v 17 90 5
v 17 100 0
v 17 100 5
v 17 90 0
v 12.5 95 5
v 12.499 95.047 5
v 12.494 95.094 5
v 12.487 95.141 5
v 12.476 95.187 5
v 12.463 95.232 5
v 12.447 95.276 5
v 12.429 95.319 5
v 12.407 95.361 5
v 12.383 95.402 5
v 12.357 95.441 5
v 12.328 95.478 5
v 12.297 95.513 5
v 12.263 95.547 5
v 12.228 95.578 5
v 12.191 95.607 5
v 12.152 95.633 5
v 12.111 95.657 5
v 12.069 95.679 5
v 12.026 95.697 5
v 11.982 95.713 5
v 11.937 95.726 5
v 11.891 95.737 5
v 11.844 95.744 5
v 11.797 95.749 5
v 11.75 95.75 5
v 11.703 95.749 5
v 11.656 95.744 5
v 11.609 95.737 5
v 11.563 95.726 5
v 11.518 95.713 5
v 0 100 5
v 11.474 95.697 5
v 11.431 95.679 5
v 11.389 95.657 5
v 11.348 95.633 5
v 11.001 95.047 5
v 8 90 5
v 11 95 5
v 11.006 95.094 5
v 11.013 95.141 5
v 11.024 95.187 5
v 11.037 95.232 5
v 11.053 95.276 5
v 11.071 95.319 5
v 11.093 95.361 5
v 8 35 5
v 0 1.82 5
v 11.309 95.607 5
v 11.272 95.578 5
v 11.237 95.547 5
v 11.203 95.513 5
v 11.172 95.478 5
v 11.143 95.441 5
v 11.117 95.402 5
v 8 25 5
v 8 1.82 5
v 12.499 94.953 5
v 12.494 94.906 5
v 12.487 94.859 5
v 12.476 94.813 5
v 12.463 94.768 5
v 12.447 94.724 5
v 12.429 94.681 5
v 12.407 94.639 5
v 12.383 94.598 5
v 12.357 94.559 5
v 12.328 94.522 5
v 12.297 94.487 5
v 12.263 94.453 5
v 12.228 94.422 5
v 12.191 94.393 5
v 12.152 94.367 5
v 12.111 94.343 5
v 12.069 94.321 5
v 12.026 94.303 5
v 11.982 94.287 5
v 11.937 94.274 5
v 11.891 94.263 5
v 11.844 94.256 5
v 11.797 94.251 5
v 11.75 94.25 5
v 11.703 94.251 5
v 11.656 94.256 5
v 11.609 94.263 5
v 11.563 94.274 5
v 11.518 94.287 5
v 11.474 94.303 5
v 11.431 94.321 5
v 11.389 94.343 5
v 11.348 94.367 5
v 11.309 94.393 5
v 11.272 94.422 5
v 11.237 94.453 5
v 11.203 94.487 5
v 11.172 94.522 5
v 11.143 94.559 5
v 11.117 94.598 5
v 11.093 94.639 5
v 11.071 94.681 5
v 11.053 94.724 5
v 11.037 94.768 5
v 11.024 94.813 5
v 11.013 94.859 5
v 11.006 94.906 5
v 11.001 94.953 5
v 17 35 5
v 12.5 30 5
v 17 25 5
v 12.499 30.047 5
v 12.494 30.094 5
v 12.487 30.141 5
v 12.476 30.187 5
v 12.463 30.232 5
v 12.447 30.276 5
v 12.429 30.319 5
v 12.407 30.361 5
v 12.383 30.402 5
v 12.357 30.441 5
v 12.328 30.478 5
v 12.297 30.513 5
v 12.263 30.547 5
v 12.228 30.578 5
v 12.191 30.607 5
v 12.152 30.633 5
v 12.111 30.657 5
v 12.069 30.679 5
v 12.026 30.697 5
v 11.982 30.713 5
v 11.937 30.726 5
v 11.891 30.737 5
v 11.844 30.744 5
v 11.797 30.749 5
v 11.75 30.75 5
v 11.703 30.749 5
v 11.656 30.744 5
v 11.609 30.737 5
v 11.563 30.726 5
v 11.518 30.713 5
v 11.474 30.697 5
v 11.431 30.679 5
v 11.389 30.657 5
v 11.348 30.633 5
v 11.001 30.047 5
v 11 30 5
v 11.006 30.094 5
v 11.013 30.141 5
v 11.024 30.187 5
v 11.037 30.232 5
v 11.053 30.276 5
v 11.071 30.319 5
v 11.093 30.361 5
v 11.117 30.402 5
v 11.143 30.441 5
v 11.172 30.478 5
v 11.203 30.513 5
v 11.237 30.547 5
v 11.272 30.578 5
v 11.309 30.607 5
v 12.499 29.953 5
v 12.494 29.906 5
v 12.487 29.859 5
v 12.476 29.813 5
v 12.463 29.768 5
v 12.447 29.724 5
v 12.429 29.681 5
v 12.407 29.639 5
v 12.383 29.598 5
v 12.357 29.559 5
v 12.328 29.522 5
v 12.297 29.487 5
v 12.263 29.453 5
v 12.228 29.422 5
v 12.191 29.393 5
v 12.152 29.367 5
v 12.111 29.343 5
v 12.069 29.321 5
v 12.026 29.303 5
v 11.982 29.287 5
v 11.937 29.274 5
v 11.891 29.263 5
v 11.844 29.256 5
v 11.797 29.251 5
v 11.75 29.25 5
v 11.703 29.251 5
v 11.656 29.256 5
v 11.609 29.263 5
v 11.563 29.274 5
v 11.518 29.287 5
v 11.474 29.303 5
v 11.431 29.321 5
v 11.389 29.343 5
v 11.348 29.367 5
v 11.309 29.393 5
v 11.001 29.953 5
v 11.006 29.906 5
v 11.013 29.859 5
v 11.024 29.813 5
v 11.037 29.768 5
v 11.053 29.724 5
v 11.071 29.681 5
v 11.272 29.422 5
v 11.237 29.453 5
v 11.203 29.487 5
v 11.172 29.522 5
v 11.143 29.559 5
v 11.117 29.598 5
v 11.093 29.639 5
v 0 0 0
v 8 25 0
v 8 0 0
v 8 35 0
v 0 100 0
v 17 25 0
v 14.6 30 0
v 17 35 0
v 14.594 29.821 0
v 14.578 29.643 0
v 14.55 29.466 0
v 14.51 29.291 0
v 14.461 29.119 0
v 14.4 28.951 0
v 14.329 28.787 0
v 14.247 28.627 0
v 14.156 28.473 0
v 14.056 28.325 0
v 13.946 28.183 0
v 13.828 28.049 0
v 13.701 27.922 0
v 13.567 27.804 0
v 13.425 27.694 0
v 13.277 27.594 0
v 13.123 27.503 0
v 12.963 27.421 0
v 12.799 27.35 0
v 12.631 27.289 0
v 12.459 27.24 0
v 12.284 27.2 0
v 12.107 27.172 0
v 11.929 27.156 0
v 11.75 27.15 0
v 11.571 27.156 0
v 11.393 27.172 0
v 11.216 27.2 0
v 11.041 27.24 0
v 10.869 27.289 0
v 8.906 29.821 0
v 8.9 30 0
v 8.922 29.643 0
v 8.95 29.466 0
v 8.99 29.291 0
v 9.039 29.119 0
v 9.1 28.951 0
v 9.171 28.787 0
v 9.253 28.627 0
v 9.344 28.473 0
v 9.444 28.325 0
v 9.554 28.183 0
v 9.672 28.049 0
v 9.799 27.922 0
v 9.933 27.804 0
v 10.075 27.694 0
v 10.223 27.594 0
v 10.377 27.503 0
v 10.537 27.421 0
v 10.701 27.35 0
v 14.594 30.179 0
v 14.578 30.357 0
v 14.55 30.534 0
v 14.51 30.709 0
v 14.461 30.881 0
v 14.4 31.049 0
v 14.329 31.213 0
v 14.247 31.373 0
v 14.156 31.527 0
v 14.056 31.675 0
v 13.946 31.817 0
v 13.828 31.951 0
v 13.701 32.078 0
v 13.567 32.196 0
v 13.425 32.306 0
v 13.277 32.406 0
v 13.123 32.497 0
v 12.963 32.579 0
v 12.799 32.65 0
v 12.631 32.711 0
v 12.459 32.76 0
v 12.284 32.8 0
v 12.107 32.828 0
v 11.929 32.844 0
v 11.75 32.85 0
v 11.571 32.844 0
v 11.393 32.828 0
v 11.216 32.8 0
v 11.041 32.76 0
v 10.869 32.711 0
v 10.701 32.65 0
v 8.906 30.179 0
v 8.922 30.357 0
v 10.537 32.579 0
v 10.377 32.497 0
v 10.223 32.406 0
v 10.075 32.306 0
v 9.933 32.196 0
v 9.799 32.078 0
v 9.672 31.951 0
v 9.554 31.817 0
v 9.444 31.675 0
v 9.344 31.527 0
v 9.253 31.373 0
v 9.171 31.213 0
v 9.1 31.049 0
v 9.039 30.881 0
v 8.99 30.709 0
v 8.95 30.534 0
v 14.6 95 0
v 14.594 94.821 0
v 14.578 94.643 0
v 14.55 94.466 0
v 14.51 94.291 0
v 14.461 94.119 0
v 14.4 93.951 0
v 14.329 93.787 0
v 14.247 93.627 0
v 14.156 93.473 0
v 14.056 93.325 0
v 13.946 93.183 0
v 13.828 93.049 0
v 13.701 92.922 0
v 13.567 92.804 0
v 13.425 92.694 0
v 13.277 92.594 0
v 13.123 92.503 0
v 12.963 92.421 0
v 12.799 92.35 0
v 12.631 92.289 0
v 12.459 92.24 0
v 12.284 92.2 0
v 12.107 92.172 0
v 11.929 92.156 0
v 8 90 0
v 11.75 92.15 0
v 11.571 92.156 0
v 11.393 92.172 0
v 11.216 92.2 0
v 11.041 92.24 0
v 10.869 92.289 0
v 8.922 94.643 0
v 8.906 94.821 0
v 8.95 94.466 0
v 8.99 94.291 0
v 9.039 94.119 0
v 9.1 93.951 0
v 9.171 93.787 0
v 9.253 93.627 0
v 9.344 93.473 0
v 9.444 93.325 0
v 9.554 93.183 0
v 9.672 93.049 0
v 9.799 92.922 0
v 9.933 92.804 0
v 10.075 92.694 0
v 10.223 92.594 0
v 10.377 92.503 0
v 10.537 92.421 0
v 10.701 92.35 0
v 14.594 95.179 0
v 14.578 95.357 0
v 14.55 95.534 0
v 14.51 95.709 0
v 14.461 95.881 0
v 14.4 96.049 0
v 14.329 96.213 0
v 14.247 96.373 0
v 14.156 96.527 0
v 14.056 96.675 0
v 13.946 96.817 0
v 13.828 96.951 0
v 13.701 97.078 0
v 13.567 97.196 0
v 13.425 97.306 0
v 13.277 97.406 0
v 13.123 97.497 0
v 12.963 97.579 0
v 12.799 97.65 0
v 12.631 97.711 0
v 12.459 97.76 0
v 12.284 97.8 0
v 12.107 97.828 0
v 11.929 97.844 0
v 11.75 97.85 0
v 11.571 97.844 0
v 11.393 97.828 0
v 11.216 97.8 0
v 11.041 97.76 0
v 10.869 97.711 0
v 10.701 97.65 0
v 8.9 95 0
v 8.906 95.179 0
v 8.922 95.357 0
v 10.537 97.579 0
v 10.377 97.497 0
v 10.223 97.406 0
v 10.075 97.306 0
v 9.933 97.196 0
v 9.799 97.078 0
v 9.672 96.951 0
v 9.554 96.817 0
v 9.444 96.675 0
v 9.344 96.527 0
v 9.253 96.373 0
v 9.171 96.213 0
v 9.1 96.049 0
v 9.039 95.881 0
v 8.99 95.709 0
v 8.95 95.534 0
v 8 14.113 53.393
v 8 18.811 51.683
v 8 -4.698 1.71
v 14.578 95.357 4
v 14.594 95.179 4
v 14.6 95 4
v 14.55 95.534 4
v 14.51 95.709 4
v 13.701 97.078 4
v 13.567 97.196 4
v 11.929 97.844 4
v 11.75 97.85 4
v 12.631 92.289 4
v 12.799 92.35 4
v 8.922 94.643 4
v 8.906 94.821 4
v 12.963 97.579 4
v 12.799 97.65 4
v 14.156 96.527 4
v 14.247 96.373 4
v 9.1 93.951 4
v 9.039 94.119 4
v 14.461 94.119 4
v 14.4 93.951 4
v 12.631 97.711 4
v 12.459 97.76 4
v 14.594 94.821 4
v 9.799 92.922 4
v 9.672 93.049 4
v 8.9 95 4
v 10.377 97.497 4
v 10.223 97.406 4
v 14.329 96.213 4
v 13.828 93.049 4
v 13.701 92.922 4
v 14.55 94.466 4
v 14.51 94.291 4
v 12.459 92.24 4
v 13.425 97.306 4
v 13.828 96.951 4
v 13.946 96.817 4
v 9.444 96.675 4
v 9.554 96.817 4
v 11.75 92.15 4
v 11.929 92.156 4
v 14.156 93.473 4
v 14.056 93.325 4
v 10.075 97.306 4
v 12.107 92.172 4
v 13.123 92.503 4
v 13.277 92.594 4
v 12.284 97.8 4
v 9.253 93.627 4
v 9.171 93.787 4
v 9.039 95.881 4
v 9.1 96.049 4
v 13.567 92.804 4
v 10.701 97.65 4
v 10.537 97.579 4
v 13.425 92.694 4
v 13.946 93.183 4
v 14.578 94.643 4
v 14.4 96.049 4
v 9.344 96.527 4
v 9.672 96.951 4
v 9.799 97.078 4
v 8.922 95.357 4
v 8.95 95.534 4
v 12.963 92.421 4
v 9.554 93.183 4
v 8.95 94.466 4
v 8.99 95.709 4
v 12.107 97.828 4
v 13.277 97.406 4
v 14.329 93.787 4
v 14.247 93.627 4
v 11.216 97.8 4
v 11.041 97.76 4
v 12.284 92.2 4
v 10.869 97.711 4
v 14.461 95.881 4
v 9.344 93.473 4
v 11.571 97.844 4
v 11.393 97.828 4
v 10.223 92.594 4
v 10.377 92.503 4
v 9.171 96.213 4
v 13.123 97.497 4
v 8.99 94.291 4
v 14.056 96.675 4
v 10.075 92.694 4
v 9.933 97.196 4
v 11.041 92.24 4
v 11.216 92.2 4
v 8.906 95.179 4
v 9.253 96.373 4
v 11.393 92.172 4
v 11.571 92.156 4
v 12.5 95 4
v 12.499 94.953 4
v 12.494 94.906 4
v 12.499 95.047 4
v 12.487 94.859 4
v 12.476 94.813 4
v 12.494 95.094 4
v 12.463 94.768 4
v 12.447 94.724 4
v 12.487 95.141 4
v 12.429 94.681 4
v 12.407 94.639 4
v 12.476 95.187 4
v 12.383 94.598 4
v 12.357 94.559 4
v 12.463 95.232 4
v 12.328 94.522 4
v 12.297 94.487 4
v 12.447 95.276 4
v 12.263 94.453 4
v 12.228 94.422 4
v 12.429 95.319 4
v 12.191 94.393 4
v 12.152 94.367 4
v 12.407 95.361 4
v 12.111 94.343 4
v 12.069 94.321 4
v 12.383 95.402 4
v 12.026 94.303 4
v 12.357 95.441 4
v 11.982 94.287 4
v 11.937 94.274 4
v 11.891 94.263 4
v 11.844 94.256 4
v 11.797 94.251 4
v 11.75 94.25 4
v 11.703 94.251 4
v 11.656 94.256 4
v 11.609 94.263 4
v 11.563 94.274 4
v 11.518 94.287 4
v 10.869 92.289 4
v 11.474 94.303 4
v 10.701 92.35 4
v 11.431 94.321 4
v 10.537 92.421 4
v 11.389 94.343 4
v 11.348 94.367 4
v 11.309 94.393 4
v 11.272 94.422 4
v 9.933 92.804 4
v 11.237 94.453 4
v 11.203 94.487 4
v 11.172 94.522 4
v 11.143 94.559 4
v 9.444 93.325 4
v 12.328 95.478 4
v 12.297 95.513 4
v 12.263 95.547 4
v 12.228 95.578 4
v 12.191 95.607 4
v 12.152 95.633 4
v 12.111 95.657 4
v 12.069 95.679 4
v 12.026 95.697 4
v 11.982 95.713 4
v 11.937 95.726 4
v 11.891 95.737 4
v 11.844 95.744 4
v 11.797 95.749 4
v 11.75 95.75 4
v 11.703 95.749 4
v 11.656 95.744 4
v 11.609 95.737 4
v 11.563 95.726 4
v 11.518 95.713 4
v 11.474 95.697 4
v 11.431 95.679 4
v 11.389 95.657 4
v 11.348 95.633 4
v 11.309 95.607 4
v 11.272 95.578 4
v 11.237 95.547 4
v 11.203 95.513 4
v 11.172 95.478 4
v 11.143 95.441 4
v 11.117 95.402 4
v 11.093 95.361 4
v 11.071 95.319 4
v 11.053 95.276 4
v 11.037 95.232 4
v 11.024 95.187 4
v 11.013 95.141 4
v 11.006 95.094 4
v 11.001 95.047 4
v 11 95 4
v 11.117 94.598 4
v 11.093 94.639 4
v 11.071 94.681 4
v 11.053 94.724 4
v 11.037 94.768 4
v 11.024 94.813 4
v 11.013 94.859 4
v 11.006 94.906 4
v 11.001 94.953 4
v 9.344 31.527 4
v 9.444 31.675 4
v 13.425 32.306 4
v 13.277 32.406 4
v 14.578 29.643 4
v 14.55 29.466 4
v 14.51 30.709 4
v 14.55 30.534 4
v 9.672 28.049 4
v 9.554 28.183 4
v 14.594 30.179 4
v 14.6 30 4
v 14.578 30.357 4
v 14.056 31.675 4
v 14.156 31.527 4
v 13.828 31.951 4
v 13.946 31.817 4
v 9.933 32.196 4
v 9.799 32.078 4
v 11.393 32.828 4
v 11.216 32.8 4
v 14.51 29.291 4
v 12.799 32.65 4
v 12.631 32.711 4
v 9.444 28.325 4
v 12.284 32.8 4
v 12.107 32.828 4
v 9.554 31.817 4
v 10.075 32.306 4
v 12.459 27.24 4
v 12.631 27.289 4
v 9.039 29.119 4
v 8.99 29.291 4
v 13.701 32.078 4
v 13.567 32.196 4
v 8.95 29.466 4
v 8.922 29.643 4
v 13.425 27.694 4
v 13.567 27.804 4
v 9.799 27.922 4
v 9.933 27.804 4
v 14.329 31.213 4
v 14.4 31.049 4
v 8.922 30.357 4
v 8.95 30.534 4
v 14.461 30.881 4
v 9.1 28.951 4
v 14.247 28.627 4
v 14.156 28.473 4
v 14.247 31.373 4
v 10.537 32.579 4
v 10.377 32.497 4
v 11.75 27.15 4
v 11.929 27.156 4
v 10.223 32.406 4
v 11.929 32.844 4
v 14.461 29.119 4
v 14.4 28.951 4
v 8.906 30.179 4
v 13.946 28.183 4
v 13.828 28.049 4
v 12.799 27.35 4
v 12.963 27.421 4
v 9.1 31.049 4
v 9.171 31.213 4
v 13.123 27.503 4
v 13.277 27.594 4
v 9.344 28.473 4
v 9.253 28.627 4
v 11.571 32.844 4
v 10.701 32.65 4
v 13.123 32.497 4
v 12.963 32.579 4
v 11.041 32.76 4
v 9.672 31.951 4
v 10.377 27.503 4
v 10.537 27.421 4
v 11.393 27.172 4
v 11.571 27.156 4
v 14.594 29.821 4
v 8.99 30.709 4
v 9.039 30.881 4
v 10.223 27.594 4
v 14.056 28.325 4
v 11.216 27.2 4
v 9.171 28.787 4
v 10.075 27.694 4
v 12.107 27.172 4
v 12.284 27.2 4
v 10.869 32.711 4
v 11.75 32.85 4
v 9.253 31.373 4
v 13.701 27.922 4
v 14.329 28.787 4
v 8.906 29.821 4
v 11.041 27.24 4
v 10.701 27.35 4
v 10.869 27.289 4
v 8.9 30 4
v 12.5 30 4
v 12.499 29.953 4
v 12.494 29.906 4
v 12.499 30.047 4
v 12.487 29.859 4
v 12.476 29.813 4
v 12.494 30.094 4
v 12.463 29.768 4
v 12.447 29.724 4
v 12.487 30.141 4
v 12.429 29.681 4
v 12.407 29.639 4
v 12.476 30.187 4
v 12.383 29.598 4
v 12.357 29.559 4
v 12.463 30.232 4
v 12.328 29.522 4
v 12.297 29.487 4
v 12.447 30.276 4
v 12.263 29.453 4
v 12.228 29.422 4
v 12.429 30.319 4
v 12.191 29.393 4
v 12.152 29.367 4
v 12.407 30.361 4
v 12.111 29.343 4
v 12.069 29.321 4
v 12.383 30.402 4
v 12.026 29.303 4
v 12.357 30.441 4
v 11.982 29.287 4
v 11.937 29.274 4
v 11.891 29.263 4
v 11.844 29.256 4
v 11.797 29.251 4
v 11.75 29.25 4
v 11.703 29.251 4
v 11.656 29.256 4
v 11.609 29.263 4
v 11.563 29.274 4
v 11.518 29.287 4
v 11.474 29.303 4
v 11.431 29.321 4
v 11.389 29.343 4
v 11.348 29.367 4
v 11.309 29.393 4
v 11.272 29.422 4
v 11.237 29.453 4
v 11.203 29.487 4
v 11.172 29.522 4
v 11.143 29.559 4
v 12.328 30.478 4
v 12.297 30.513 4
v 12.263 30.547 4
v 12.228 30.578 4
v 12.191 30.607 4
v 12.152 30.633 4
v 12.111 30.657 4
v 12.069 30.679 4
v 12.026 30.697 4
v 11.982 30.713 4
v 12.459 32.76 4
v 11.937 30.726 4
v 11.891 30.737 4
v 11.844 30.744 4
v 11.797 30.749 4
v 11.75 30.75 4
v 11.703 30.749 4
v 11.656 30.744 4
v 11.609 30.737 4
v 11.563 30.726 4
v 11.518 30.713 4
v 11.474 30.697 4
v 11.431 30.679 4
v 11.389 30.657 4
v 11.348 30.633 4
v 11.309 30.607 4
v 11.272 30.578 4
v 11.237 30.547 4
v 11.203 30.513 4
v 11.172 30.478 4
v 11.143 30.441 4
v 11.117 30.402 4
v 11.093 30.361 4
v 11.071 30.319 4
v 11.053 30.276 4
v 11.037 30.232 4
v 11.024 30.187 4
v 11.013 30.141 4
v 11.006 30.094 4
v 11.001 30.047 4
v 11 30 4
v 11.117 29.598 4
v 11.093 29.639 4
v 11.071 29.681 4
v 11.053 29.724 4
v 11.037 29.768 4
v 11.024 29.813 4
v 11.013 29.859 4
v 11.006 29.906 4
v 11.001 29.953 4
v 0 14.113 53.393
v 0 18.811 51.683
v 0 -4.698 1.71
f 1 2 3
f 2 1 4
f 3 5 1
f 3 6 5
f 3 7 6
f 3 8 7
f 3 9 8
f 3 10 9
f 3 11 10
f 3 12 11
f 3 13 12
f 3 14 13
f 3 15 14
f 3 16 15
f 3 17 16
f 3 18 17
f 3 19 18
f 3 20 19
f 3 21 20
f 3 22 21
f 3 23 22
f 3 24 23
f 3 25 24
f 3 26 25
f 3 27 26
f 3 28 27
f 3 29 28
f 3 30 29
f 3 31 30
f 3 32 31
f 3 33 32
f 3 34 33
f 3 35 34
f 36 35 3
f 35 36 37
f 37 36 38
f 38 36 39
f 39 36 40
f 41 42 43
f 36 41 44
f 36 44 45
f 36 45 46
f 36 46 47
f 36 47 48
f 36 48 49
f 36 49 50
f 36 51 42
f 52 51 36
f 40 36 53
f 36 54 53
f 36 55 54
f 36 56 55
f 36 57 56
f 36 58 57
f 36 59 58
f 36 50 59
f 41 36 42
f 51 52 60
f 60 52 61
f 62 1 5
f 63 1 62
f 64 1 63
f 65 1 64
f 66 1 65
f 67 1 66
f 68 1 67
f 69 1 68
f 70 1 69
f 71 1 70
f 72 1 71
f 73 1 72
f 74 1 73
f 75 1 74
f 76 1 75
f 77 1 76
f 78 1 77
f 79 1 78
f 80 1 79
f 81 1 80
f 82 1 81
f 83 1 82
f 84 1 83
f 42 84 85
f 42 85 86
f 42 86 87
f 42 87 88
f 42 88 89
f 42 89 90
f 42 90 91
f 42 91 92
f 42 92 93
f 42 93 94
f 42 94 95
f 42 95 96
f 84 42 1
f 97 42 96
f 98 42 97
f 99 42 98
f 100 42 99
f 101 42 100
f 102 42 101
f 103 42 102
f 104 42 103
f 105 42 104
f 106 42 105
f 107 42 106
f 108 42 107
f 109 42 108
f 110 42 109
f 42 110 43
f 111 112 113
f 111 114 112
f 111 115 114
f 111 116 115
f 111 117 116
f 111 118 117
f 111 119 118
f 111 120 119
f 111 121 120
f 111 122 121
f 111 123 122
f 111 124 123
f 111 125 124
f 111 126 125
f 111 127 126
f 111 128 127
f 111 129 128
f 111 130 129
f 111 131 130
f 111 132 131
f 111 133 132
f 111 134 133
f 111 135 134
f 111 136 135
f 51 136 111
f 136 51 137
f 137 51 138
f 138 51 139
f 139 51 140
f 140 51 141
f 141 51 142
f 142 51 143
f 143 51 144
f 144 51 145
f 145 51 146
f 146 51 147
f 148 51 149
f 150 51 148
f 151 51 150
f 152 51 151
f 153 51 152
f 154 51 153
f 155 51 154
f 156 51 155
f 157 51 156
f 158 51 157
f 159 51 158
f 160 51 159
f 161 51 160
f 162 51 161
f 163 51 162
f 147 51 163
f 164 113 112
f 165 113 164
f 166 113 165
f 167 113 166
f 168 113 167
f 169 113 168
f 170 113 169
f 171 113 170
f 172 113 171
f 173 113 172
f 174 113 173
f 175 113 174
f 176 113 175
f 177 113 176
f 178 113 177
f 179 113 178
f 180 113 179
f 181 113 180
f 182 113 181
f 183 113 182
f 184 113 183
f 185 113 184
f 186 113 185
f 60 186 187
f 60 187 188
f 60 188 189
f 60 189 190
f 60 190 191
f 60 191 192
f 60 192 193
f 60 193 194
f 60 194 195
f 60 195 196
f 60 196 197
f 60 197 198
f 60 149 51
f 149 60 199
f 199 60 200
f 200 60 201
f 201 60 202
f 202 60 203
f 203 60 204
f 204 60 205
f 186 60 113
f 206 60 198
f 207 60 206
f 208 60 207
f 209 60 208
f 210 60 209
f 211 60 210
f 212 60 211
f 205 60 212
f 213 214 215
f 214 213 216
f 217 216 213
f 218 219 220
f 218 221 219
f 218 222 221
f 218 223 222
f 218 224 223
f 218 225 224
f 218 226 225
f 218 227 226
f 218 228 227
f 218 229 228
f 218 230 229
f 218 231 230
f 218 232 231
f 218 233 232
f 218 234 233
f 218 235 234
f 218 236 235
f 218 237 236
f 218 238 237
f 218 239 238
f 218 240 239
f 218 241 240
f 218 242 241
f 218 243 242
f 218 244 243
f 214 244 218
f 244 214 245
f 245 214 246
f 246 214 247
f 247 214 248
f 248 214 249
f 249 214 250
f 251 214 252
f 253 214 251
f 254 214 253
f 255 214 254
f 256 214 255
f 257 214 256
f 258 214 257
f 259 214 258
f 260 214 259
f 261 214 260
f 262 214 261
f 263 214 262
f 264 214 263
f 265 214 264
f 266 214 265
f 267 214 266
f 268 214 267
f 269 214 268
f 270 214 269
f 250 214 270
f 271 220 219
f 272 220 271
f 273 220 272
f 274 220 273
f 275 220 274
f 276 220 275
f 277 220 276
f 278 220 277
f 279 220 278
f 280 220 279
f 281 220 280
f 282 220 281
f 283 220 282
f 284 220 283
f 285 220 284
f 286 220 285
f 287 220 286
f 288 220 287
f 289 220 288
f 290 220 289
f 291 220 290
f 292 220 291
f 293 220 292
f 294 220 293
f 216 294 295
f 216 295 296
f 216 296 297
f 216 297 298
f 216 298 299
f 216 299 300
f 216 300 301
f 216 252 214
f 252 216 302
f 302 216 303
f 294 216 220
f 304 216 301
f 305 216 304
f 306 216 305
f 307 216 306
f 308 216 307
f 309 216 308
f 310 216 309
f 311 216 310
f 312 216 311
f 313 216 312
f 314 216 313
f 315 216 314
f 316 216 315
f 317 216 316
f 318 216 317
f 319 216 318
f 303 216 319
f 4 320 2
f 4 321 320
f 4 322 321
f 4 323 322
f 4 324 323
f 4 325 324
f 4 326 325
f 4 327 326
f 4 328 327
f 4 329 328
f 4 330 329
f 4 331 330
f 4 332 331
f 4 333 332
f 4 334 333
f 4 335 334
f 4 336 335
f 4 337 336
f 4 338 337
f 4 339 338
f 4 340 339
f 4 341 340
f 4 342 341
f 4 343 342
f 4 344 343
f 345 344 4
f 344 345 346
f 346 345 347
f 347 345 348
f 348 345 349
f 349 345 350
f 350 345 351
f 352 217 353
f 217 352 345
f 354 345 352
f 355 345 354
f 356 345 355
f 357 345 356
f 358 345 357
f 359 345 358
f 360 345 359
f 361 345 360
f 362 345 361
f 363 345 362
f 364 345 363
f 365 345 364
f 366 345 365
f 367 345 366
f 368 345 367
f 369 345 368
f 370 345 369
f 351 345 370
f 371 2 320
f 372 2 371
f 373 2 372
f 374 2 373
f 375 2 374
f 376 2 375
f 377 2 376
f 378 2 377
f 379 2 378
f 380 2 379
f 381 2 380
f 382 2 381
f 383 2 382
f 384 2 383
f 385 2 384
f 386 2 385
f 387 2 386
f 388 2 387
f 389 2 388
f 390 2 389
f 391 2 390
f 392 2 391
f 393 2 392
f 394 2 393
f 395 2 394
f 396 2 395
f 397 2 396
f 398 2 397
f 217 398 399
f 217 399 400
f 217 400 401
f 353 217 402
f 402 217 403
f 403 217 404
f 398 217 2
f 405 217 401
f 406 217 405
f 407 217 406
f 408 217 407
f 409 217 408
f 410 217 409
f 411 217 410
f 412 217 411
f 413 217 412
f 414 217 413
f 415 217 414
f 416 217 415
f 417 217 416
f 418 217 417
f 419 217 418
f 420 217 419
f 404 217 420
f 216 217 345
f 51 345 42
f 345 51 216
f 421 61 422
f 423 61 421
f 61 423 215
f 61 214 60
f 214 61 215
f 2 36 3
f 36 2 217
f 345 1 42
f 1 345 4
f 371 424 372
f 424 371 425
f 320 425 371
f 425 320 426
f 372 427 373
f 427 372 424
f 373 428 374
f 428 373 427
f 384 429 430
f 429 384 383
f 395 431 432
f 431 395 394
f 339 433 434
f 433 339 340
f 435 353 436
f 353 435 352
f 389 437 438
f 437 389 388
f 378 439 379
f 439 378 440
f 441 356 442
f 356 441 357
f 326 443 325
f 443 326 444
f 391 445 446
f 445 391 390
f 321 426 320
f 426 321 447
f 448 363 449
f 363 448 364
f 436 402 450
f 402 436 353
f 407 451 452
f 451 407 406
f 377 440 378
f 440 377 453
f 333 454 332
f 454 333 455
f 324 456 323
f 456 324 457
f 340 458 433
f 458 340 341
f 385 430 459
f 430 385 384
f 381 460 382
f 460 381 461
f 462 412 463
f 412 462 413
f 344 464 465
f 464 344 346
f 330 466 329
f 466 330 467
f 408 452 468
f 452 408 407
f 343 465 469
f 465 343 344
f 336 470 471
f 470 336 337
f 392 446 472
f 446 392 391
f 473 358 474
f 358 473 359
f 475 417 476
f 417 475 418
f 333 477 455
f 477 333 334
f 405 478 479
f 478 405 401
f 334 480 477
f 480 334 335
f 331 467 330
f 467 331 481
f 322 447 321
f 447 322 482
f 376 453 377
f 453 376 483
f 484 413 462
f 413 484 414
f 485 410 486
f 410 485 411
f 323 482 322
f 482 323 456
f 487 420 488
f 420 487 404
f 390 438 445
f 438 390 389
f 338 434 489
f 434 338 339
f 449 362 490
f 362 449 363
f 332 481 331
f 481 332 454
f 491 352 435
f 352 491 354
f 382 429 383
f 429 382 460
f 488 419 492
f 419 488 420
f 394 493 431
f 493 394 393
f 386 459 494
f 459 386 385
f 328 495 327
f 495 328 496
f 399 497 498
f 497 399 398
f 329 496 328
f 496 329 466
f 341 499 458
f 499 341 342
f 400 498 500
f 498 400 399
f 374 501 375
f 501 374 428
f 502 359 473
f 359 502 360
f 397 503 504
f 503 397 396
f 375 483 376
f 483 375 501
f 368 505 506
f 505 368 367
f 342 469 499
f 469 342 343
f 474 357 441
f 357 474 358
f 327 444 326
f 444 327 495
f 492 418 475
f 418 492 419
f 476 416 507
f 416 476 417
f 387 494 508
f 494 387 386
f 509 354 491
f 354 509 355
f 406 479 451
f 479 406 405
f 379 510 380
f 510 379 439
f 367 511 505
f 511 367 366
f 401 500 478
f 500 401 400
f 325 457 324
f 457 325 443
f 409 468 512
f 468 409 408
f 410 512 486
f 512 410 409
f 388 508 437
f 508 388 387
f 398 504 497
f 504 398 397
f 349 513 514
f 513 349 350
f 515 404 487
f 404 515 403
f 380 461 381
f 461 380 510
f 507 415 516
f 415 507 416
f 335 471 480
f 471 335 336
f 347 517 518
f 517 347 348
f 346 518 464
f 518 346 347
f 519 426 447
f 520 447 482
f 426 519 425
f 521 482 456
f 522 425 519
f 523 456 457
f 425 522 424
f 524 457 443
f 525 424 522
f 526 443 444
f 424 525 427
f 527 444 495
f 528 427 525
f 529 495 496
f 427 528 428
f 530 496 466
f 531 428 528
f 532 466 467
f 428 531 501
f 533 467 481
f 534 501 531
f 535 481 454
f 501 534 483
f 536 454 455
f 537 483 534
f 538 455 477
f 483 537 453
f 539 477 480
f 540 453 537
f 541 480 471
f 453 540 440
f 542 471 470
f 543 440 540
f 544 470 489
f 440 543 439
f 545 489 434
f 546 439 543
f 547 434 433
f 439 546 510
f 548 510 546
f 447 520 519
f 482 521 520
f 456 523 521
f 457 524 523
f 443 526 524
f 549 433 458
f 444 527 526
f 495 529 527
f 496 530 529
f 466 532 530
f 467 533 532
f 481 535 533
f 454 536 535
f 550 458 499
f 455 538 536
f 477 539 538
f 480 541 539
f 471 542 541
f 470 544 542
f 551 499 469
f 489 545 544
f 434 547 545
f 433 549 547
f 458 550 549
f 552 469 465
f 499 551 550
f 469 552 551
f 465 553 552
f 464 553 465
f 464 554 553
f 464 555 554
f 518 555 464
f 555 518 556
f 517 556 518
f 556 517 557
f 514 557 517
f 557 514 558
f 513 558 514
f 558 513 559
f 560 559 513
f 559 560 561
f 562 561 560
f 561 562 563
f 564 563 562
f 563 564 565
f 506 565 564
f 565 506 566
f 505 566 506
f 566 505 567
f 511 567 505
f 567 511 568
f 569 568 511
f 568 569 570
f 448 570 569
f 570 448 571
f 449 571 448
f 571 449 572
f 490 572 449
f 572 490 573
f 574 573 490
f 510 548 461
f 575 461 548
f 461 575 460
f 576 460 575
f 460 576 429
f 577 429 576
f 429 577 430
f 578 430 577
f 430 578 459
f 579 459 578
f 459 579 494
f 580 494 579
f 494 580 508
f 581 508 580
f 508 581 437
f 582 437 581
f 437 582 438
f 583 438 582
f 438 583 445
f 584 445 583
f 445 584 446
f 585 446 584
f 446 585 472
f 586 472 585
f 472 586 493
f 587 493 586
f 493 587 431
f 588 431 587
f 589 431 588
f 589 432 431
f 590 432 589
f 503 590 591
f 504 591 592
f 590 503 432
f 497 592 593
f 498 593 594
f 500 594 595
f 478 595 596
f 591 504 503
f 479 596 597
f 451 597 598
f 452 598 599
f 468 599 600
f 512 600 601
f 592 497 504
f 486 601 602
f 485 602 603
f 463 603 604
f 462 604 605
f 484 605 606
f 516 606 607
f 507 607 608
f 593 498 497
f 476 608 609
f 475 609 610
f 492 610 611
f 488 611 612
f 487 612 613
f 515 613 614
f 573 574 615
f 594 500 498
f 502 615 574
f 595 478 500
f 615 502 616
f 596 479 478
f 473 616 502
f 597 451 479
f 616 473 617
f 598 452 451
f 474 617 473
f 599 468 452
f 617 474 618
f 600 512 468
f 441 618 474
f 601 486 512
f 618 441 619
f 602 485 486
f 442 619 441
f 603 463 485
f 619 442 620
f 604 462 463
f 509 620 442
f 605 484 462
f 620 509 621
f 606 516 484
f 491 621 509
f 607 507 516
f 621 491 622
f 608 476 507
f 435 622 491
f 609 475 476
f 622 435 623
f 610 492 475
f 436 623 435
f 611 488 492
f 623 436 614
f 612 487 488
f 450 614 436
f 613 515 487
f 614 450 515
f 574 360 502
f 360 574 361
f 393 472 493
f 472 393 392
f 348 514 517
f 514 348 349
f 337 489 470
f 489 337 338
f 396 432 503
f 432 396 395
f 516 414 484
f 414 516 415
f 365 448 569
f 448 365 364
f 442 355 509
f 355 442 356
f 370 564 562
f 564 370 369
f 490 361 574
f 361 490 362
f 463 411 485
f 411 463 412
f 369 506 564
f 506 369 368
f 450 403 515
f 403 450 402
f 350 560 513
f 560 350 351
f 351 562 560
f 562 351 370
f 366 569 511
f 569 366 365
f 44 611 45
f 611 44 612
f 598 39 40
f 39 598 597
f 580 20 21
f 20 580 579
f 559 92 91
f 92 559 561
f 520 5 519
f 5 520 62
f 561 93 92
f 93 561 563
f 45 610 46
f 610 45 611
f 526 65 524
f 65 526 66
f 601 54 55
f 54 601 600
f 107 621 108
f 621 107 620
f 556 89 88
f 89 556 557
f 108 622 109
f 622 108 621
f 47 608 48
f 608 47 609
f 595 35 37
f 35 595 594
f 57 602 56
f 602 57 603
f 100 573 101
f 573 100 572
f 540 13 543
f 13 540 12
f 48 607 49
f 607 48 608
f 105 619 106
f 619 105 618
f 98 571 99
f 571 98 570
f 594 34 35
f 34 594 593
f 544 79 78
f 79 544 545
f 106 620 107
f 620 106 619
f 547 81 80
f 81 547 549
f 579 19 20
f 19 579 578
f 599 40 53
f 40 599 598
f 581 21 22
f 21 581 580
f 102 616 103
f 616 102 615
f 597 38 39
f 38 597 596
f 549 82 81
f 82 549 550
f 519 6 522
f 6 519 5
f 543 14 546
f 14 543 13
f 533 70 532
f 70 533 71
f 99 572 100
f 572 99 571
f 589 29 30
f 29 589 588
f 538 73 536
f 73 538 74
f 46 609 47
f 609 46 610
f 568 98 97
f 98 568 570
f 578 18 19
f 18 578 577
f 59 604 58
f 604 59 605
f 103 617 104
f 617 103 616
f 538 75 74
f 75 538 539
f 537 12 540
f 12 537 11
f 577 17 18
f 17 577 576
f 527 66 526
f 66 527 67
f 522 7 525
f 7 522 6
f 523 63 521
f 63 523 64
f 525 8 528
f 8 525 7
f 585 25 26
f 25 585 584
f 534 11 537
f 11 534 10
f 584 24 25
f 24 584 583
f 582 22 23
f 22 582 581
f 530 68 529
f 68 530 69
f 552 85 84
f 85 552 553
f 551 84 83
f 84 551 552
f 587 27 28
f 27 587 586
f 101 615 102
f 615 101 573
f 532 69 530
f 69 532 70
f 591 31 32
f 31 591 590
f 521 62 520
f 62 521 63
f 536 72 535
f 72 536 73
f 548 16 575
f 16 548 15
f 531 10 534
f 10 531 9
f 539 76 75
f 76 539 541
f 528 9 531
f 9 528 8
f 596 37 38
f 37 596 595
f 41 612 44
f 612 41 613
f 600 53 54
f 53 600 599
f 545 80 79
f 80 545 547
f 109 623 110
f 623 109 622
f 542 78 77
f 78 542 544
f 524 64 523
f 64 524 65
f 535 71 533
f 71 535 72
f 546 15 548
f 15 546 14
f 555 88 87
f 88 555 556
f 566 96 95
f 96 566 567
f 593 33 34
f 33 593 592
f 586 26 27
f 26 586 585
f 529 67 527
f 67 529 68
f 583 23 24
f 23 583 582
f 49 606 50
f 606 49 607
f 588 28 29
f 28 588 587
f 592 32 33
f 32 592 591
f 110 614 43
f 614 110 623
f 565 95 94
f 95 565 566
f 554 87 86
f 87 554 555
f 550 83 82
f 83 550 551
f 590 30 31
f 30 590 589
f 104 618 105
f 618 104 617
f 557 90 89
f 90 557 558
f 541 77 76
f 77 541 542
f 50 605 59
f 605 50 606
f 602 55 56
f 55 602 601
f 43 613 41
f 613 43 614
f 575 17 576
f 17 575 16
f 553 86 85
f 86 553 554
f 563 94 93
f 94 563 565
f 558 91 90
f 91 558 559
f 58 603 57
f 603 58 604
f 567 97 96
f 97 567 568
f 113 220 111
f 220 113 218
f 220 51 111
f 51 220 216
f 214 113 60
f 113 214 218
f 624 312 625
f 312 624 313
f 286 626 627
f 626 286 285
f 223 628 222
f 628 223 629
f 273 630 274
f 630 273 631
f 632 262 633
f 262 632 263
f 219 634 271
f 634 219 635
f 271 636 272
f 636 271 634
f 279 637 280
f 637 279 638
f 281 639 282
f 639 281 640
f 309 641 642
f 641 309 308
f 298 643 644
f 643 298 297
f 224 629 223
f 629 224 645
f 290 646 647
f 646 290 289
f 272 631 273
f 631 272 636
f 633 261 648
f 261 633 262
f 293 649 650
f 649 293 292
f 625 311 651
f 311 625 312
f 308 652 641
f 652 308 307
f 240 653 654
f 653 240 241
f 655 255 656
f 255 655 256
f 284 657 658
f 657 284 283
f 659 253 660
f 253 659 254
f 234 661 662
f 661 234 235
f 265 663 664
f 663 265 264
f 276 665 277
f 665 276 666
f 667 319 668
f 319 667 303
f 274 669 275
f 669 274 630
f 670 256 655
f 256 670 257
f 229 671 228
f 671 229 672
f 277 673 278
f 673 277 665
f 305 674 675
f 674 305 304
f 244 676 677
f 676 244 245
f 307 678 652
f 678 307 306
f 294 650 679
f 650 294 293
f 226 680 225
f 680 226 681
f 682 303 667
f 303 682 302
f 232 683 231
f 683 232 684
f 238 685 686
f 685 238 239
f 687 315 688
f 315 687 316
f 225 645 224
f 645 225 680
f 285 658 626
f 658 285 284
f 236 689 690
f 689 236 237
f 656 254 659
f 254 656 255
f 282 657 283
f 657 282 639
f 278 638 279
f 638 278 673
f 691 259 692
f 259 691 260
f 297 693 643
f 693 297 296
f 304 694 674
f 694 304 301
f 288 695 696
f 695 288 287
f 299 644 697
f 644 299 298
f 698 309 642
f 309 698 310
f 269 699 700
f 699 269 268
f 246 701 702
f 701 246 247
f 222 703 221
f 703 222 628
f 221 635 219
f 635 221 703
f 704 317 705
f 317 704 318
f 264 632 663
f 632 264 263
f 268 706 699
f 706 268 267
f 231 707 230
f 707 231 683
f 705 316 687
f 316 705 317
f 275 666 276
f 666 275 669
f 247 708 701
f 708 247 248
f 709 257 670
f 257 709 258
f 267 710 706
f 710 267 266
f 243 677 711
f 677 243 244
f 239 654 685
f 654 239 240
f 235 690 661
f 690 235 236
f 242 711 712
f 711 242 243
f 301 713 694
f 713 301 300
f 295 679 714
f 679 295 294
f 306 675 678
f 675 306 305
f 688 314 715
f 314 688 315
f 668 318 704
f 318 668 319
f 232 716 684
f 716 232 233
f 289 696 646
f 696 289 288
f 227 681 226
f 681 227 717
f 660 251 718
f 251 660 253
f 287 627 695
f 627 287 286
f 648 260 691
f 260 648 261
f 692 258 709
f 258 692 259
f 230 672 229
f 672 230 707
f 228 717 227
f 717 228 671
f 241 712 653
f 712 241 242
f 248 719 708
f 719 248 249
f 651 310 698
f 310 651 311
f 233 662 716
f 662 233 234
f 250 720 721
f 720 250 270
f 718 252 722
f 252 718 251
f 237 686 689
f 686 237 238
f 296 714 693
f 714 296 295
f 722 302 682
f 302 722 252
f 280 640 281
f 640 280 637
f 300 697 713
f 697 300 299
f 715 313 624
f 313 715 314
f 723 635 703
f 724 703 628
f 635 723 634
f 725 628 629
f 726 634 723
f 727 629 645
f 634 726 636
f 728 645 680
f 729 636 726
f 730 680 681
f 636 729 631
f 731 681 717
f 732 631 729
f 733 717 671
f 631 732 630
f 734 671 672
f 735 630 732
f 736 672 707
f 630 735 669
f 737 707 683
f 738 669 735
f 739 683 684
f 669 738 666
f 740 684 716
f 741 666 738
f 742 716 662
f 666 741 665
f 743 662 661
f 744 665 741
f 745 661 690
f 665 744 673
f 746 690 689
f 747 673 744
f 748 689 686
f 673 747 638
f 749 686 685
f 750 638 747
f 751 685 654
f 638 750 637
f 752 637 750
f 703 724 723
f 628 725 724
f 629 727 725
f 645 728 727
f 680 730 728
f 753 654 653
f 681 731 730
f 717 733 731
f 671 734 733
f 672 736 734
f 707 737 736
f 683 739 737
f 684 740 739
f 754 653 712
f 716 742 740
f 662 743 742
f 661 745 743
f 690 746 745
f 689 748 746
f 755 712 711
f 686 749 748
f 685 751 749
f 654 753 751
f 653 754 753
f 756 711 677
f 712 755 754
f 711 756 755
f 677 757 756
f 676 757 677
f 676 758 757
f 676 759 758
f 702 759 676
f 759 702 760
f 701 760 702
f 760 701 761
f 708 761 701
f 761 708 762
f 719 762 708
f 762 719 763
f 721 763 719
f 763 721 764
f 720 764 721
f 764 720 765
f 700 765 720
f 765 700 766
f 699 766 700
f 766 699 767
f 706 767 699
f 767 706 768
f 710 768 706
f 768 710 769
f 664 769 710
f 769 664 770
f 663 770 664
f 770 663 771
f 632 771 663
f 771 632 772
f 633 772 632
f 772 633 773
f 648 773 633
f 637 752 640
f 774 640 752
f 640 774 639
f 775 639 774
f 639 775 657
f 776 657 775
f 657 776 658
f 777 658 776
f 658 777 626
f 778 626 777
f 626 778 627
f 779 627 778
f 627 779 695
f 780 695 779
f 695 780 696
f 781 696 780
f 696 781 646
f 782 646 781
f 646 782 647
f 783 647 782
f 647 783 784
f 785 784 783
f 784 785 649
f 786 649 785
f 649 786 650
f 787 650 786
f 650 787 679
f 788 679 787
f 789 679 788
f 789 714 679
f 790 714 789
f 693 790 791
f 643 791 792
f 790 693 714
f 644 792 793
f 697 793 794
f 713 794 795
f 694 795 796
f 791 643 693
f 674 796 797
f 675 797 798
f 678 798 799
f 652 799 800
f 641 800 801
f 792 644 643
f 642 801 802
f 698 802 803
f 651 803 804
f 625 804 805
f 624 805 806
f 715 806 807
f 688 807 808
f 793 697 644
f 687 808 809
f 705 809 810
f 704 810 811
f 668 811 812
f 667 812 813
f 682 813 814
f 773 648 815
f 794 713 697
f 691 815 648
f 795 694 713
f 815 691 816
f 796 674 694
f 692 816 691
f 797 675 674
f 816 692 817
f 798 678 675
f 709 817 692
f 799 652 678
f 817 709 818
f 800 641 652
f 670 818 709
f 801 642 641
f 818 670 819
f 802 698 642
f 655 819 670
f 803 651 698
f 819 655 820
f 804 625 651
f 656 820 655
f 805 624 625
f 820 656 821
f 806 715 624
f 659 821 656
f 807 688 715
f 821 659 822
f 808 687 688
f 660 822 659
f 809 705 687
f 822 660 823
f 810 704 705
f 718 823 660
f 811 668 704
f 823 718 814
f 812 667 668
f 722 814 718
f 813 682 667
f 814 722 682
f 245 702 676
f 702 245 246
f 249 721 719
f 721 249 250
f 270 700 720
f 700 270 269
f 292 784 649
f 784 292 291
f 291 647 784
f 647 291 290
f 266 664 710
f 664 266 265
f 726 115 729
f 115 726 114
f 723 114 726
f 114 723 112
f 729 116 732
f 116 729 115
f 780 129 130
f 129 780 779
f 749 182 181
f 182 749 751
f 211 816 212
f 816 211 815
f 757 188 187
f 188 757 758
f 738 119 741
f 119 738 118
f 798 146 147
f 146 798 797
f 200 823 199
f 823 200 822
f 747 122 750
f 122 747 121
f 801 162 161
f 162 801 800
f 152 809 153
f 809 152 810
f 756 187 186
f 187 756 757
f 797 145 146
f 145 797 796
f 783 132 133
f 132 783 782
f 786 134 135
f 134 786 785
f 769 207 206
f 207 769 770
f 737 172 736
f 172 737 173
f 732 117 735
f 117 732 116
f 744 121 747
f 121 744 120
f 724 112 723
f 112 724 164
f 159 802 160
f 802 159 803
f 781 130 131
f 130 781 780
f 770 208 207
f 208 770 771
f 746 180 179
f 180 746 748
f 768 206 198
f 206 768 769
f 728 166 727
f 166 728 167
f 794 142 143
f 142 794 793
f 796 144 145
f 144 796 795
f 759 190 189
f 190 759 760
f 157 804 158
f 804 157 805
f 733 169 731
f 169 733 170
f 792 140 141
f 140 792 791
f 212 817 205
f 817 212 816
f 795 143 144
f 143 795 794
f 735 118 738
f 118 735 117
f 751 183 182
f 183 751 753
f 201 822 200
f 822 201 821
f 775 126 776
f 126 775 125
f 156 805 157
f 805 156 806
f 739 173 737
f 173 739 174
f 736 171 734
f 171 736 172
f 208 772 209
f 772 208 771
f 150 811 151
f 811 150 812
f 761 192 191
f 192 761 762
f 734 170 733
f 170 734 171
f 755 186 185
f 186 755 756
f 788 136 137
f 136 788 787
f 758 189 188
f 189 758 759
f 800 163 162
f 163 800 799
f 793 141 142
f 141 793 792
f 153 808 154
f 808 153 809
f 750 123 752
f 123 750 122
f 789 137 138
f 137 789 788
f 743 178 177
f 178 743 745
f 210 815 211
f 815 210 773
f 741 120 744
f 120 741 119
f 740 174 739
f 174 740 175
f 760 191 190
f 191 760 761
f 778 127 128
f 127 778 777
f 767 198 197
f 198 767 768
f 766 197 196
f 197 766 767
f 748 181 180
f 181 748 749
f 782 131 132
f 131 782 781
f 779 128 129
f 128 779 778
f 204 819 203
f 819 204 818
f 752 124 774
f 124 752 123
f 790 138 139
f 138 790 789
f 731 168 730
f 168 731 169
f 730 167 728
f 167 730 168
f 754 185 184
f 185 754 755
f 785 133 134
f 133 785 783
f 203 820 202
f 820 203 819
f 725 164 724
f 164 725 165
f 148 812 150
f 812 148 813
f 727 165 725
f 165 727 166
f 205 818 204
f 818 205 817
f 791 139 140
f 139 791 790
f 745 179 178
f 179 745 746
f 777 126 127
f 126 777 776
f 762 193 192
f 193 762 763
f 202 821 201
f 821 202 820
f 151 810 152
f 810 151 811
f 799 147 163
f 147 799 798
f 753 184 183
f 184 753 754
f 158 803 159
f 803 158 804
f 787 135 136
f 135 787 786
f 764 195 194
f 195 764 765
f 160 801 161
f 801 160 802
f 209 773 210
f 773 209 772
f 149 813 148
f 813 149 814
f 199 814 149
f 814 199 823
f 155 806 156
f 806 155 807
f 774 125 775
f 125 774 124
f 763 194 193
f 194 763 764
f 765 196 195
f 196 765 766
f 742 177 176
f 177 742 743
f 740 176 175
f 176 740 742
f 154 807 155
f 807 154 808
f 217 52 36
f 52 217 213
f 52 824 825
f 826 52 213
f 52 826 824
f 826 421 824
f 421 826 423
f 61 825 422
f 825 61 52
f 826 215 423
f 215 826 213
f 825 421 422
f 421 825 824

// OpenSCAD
$fs=0.01;
$fn=100;

//0=left piece, 1=right piece
mirror_part = 0; //[0, 1]

main_rod_length = 100; //[90:130]
main_rod_width = 8; //[8:15]
main_rod_height = 5; //[5:10]
screw_outside_diameter = 5.7;
screw_outside_height = 4;
screw_hole_diameter = 1.5;

support_rod_length = 55; //[50:80]
support_rod_width = main_rod_width;
support_rod_height = main_rod_height;
support_rod_angle = 70; //[45:90]

mirror([mirror_part,0,0])
union() {
    //main rod
    cube([main_rod_width,main_rod_length,main_rod_height], center=false);

    //top screw 
    difference(){
        translate([main_rod_width,main_rod_length-10,0]){
            cube([9,10,main_rod_height], center=false);
        }
        translate([main_rod_width+7.5/2,main_rod_length-10+5,-1]){
            color("red") cylinder(h=screw_outside_height+1,d=screw_outside_diameter ,center=false);
        }
        translate([main_rod_width+7.5/2,main_rod_length-10+5,-1]){
            color("red") cylinder(h=main_rod_height+2,d=screw_hole_diameter,center=false);
        }
    }

    //bottom screw
    difference(){
        translate([main_rod_width,main_rod_length-10-65,0]){
            cube([9,10,main_rod_height], center=false);
        }
        translate([main_rod_width+7.5/2,main_rod_length-10-65+5,-1]){
            color("red") cylinder(h=screw_outside_height+1,d=screw_outside_diameter,center=false);
        }
        translate([main_rod_width+7.5/2,main_rod_length-10-65+5,-1]){
            color("red") cylinder(h=main_rod_height+2,d=screw_hole_diameter,center=false);
        }
    }

    //desk support rod
    rotate([support_rod_angle,0,0]) cube([support_rod_width,support_rod_length,support_rod_height], center=false);

}
